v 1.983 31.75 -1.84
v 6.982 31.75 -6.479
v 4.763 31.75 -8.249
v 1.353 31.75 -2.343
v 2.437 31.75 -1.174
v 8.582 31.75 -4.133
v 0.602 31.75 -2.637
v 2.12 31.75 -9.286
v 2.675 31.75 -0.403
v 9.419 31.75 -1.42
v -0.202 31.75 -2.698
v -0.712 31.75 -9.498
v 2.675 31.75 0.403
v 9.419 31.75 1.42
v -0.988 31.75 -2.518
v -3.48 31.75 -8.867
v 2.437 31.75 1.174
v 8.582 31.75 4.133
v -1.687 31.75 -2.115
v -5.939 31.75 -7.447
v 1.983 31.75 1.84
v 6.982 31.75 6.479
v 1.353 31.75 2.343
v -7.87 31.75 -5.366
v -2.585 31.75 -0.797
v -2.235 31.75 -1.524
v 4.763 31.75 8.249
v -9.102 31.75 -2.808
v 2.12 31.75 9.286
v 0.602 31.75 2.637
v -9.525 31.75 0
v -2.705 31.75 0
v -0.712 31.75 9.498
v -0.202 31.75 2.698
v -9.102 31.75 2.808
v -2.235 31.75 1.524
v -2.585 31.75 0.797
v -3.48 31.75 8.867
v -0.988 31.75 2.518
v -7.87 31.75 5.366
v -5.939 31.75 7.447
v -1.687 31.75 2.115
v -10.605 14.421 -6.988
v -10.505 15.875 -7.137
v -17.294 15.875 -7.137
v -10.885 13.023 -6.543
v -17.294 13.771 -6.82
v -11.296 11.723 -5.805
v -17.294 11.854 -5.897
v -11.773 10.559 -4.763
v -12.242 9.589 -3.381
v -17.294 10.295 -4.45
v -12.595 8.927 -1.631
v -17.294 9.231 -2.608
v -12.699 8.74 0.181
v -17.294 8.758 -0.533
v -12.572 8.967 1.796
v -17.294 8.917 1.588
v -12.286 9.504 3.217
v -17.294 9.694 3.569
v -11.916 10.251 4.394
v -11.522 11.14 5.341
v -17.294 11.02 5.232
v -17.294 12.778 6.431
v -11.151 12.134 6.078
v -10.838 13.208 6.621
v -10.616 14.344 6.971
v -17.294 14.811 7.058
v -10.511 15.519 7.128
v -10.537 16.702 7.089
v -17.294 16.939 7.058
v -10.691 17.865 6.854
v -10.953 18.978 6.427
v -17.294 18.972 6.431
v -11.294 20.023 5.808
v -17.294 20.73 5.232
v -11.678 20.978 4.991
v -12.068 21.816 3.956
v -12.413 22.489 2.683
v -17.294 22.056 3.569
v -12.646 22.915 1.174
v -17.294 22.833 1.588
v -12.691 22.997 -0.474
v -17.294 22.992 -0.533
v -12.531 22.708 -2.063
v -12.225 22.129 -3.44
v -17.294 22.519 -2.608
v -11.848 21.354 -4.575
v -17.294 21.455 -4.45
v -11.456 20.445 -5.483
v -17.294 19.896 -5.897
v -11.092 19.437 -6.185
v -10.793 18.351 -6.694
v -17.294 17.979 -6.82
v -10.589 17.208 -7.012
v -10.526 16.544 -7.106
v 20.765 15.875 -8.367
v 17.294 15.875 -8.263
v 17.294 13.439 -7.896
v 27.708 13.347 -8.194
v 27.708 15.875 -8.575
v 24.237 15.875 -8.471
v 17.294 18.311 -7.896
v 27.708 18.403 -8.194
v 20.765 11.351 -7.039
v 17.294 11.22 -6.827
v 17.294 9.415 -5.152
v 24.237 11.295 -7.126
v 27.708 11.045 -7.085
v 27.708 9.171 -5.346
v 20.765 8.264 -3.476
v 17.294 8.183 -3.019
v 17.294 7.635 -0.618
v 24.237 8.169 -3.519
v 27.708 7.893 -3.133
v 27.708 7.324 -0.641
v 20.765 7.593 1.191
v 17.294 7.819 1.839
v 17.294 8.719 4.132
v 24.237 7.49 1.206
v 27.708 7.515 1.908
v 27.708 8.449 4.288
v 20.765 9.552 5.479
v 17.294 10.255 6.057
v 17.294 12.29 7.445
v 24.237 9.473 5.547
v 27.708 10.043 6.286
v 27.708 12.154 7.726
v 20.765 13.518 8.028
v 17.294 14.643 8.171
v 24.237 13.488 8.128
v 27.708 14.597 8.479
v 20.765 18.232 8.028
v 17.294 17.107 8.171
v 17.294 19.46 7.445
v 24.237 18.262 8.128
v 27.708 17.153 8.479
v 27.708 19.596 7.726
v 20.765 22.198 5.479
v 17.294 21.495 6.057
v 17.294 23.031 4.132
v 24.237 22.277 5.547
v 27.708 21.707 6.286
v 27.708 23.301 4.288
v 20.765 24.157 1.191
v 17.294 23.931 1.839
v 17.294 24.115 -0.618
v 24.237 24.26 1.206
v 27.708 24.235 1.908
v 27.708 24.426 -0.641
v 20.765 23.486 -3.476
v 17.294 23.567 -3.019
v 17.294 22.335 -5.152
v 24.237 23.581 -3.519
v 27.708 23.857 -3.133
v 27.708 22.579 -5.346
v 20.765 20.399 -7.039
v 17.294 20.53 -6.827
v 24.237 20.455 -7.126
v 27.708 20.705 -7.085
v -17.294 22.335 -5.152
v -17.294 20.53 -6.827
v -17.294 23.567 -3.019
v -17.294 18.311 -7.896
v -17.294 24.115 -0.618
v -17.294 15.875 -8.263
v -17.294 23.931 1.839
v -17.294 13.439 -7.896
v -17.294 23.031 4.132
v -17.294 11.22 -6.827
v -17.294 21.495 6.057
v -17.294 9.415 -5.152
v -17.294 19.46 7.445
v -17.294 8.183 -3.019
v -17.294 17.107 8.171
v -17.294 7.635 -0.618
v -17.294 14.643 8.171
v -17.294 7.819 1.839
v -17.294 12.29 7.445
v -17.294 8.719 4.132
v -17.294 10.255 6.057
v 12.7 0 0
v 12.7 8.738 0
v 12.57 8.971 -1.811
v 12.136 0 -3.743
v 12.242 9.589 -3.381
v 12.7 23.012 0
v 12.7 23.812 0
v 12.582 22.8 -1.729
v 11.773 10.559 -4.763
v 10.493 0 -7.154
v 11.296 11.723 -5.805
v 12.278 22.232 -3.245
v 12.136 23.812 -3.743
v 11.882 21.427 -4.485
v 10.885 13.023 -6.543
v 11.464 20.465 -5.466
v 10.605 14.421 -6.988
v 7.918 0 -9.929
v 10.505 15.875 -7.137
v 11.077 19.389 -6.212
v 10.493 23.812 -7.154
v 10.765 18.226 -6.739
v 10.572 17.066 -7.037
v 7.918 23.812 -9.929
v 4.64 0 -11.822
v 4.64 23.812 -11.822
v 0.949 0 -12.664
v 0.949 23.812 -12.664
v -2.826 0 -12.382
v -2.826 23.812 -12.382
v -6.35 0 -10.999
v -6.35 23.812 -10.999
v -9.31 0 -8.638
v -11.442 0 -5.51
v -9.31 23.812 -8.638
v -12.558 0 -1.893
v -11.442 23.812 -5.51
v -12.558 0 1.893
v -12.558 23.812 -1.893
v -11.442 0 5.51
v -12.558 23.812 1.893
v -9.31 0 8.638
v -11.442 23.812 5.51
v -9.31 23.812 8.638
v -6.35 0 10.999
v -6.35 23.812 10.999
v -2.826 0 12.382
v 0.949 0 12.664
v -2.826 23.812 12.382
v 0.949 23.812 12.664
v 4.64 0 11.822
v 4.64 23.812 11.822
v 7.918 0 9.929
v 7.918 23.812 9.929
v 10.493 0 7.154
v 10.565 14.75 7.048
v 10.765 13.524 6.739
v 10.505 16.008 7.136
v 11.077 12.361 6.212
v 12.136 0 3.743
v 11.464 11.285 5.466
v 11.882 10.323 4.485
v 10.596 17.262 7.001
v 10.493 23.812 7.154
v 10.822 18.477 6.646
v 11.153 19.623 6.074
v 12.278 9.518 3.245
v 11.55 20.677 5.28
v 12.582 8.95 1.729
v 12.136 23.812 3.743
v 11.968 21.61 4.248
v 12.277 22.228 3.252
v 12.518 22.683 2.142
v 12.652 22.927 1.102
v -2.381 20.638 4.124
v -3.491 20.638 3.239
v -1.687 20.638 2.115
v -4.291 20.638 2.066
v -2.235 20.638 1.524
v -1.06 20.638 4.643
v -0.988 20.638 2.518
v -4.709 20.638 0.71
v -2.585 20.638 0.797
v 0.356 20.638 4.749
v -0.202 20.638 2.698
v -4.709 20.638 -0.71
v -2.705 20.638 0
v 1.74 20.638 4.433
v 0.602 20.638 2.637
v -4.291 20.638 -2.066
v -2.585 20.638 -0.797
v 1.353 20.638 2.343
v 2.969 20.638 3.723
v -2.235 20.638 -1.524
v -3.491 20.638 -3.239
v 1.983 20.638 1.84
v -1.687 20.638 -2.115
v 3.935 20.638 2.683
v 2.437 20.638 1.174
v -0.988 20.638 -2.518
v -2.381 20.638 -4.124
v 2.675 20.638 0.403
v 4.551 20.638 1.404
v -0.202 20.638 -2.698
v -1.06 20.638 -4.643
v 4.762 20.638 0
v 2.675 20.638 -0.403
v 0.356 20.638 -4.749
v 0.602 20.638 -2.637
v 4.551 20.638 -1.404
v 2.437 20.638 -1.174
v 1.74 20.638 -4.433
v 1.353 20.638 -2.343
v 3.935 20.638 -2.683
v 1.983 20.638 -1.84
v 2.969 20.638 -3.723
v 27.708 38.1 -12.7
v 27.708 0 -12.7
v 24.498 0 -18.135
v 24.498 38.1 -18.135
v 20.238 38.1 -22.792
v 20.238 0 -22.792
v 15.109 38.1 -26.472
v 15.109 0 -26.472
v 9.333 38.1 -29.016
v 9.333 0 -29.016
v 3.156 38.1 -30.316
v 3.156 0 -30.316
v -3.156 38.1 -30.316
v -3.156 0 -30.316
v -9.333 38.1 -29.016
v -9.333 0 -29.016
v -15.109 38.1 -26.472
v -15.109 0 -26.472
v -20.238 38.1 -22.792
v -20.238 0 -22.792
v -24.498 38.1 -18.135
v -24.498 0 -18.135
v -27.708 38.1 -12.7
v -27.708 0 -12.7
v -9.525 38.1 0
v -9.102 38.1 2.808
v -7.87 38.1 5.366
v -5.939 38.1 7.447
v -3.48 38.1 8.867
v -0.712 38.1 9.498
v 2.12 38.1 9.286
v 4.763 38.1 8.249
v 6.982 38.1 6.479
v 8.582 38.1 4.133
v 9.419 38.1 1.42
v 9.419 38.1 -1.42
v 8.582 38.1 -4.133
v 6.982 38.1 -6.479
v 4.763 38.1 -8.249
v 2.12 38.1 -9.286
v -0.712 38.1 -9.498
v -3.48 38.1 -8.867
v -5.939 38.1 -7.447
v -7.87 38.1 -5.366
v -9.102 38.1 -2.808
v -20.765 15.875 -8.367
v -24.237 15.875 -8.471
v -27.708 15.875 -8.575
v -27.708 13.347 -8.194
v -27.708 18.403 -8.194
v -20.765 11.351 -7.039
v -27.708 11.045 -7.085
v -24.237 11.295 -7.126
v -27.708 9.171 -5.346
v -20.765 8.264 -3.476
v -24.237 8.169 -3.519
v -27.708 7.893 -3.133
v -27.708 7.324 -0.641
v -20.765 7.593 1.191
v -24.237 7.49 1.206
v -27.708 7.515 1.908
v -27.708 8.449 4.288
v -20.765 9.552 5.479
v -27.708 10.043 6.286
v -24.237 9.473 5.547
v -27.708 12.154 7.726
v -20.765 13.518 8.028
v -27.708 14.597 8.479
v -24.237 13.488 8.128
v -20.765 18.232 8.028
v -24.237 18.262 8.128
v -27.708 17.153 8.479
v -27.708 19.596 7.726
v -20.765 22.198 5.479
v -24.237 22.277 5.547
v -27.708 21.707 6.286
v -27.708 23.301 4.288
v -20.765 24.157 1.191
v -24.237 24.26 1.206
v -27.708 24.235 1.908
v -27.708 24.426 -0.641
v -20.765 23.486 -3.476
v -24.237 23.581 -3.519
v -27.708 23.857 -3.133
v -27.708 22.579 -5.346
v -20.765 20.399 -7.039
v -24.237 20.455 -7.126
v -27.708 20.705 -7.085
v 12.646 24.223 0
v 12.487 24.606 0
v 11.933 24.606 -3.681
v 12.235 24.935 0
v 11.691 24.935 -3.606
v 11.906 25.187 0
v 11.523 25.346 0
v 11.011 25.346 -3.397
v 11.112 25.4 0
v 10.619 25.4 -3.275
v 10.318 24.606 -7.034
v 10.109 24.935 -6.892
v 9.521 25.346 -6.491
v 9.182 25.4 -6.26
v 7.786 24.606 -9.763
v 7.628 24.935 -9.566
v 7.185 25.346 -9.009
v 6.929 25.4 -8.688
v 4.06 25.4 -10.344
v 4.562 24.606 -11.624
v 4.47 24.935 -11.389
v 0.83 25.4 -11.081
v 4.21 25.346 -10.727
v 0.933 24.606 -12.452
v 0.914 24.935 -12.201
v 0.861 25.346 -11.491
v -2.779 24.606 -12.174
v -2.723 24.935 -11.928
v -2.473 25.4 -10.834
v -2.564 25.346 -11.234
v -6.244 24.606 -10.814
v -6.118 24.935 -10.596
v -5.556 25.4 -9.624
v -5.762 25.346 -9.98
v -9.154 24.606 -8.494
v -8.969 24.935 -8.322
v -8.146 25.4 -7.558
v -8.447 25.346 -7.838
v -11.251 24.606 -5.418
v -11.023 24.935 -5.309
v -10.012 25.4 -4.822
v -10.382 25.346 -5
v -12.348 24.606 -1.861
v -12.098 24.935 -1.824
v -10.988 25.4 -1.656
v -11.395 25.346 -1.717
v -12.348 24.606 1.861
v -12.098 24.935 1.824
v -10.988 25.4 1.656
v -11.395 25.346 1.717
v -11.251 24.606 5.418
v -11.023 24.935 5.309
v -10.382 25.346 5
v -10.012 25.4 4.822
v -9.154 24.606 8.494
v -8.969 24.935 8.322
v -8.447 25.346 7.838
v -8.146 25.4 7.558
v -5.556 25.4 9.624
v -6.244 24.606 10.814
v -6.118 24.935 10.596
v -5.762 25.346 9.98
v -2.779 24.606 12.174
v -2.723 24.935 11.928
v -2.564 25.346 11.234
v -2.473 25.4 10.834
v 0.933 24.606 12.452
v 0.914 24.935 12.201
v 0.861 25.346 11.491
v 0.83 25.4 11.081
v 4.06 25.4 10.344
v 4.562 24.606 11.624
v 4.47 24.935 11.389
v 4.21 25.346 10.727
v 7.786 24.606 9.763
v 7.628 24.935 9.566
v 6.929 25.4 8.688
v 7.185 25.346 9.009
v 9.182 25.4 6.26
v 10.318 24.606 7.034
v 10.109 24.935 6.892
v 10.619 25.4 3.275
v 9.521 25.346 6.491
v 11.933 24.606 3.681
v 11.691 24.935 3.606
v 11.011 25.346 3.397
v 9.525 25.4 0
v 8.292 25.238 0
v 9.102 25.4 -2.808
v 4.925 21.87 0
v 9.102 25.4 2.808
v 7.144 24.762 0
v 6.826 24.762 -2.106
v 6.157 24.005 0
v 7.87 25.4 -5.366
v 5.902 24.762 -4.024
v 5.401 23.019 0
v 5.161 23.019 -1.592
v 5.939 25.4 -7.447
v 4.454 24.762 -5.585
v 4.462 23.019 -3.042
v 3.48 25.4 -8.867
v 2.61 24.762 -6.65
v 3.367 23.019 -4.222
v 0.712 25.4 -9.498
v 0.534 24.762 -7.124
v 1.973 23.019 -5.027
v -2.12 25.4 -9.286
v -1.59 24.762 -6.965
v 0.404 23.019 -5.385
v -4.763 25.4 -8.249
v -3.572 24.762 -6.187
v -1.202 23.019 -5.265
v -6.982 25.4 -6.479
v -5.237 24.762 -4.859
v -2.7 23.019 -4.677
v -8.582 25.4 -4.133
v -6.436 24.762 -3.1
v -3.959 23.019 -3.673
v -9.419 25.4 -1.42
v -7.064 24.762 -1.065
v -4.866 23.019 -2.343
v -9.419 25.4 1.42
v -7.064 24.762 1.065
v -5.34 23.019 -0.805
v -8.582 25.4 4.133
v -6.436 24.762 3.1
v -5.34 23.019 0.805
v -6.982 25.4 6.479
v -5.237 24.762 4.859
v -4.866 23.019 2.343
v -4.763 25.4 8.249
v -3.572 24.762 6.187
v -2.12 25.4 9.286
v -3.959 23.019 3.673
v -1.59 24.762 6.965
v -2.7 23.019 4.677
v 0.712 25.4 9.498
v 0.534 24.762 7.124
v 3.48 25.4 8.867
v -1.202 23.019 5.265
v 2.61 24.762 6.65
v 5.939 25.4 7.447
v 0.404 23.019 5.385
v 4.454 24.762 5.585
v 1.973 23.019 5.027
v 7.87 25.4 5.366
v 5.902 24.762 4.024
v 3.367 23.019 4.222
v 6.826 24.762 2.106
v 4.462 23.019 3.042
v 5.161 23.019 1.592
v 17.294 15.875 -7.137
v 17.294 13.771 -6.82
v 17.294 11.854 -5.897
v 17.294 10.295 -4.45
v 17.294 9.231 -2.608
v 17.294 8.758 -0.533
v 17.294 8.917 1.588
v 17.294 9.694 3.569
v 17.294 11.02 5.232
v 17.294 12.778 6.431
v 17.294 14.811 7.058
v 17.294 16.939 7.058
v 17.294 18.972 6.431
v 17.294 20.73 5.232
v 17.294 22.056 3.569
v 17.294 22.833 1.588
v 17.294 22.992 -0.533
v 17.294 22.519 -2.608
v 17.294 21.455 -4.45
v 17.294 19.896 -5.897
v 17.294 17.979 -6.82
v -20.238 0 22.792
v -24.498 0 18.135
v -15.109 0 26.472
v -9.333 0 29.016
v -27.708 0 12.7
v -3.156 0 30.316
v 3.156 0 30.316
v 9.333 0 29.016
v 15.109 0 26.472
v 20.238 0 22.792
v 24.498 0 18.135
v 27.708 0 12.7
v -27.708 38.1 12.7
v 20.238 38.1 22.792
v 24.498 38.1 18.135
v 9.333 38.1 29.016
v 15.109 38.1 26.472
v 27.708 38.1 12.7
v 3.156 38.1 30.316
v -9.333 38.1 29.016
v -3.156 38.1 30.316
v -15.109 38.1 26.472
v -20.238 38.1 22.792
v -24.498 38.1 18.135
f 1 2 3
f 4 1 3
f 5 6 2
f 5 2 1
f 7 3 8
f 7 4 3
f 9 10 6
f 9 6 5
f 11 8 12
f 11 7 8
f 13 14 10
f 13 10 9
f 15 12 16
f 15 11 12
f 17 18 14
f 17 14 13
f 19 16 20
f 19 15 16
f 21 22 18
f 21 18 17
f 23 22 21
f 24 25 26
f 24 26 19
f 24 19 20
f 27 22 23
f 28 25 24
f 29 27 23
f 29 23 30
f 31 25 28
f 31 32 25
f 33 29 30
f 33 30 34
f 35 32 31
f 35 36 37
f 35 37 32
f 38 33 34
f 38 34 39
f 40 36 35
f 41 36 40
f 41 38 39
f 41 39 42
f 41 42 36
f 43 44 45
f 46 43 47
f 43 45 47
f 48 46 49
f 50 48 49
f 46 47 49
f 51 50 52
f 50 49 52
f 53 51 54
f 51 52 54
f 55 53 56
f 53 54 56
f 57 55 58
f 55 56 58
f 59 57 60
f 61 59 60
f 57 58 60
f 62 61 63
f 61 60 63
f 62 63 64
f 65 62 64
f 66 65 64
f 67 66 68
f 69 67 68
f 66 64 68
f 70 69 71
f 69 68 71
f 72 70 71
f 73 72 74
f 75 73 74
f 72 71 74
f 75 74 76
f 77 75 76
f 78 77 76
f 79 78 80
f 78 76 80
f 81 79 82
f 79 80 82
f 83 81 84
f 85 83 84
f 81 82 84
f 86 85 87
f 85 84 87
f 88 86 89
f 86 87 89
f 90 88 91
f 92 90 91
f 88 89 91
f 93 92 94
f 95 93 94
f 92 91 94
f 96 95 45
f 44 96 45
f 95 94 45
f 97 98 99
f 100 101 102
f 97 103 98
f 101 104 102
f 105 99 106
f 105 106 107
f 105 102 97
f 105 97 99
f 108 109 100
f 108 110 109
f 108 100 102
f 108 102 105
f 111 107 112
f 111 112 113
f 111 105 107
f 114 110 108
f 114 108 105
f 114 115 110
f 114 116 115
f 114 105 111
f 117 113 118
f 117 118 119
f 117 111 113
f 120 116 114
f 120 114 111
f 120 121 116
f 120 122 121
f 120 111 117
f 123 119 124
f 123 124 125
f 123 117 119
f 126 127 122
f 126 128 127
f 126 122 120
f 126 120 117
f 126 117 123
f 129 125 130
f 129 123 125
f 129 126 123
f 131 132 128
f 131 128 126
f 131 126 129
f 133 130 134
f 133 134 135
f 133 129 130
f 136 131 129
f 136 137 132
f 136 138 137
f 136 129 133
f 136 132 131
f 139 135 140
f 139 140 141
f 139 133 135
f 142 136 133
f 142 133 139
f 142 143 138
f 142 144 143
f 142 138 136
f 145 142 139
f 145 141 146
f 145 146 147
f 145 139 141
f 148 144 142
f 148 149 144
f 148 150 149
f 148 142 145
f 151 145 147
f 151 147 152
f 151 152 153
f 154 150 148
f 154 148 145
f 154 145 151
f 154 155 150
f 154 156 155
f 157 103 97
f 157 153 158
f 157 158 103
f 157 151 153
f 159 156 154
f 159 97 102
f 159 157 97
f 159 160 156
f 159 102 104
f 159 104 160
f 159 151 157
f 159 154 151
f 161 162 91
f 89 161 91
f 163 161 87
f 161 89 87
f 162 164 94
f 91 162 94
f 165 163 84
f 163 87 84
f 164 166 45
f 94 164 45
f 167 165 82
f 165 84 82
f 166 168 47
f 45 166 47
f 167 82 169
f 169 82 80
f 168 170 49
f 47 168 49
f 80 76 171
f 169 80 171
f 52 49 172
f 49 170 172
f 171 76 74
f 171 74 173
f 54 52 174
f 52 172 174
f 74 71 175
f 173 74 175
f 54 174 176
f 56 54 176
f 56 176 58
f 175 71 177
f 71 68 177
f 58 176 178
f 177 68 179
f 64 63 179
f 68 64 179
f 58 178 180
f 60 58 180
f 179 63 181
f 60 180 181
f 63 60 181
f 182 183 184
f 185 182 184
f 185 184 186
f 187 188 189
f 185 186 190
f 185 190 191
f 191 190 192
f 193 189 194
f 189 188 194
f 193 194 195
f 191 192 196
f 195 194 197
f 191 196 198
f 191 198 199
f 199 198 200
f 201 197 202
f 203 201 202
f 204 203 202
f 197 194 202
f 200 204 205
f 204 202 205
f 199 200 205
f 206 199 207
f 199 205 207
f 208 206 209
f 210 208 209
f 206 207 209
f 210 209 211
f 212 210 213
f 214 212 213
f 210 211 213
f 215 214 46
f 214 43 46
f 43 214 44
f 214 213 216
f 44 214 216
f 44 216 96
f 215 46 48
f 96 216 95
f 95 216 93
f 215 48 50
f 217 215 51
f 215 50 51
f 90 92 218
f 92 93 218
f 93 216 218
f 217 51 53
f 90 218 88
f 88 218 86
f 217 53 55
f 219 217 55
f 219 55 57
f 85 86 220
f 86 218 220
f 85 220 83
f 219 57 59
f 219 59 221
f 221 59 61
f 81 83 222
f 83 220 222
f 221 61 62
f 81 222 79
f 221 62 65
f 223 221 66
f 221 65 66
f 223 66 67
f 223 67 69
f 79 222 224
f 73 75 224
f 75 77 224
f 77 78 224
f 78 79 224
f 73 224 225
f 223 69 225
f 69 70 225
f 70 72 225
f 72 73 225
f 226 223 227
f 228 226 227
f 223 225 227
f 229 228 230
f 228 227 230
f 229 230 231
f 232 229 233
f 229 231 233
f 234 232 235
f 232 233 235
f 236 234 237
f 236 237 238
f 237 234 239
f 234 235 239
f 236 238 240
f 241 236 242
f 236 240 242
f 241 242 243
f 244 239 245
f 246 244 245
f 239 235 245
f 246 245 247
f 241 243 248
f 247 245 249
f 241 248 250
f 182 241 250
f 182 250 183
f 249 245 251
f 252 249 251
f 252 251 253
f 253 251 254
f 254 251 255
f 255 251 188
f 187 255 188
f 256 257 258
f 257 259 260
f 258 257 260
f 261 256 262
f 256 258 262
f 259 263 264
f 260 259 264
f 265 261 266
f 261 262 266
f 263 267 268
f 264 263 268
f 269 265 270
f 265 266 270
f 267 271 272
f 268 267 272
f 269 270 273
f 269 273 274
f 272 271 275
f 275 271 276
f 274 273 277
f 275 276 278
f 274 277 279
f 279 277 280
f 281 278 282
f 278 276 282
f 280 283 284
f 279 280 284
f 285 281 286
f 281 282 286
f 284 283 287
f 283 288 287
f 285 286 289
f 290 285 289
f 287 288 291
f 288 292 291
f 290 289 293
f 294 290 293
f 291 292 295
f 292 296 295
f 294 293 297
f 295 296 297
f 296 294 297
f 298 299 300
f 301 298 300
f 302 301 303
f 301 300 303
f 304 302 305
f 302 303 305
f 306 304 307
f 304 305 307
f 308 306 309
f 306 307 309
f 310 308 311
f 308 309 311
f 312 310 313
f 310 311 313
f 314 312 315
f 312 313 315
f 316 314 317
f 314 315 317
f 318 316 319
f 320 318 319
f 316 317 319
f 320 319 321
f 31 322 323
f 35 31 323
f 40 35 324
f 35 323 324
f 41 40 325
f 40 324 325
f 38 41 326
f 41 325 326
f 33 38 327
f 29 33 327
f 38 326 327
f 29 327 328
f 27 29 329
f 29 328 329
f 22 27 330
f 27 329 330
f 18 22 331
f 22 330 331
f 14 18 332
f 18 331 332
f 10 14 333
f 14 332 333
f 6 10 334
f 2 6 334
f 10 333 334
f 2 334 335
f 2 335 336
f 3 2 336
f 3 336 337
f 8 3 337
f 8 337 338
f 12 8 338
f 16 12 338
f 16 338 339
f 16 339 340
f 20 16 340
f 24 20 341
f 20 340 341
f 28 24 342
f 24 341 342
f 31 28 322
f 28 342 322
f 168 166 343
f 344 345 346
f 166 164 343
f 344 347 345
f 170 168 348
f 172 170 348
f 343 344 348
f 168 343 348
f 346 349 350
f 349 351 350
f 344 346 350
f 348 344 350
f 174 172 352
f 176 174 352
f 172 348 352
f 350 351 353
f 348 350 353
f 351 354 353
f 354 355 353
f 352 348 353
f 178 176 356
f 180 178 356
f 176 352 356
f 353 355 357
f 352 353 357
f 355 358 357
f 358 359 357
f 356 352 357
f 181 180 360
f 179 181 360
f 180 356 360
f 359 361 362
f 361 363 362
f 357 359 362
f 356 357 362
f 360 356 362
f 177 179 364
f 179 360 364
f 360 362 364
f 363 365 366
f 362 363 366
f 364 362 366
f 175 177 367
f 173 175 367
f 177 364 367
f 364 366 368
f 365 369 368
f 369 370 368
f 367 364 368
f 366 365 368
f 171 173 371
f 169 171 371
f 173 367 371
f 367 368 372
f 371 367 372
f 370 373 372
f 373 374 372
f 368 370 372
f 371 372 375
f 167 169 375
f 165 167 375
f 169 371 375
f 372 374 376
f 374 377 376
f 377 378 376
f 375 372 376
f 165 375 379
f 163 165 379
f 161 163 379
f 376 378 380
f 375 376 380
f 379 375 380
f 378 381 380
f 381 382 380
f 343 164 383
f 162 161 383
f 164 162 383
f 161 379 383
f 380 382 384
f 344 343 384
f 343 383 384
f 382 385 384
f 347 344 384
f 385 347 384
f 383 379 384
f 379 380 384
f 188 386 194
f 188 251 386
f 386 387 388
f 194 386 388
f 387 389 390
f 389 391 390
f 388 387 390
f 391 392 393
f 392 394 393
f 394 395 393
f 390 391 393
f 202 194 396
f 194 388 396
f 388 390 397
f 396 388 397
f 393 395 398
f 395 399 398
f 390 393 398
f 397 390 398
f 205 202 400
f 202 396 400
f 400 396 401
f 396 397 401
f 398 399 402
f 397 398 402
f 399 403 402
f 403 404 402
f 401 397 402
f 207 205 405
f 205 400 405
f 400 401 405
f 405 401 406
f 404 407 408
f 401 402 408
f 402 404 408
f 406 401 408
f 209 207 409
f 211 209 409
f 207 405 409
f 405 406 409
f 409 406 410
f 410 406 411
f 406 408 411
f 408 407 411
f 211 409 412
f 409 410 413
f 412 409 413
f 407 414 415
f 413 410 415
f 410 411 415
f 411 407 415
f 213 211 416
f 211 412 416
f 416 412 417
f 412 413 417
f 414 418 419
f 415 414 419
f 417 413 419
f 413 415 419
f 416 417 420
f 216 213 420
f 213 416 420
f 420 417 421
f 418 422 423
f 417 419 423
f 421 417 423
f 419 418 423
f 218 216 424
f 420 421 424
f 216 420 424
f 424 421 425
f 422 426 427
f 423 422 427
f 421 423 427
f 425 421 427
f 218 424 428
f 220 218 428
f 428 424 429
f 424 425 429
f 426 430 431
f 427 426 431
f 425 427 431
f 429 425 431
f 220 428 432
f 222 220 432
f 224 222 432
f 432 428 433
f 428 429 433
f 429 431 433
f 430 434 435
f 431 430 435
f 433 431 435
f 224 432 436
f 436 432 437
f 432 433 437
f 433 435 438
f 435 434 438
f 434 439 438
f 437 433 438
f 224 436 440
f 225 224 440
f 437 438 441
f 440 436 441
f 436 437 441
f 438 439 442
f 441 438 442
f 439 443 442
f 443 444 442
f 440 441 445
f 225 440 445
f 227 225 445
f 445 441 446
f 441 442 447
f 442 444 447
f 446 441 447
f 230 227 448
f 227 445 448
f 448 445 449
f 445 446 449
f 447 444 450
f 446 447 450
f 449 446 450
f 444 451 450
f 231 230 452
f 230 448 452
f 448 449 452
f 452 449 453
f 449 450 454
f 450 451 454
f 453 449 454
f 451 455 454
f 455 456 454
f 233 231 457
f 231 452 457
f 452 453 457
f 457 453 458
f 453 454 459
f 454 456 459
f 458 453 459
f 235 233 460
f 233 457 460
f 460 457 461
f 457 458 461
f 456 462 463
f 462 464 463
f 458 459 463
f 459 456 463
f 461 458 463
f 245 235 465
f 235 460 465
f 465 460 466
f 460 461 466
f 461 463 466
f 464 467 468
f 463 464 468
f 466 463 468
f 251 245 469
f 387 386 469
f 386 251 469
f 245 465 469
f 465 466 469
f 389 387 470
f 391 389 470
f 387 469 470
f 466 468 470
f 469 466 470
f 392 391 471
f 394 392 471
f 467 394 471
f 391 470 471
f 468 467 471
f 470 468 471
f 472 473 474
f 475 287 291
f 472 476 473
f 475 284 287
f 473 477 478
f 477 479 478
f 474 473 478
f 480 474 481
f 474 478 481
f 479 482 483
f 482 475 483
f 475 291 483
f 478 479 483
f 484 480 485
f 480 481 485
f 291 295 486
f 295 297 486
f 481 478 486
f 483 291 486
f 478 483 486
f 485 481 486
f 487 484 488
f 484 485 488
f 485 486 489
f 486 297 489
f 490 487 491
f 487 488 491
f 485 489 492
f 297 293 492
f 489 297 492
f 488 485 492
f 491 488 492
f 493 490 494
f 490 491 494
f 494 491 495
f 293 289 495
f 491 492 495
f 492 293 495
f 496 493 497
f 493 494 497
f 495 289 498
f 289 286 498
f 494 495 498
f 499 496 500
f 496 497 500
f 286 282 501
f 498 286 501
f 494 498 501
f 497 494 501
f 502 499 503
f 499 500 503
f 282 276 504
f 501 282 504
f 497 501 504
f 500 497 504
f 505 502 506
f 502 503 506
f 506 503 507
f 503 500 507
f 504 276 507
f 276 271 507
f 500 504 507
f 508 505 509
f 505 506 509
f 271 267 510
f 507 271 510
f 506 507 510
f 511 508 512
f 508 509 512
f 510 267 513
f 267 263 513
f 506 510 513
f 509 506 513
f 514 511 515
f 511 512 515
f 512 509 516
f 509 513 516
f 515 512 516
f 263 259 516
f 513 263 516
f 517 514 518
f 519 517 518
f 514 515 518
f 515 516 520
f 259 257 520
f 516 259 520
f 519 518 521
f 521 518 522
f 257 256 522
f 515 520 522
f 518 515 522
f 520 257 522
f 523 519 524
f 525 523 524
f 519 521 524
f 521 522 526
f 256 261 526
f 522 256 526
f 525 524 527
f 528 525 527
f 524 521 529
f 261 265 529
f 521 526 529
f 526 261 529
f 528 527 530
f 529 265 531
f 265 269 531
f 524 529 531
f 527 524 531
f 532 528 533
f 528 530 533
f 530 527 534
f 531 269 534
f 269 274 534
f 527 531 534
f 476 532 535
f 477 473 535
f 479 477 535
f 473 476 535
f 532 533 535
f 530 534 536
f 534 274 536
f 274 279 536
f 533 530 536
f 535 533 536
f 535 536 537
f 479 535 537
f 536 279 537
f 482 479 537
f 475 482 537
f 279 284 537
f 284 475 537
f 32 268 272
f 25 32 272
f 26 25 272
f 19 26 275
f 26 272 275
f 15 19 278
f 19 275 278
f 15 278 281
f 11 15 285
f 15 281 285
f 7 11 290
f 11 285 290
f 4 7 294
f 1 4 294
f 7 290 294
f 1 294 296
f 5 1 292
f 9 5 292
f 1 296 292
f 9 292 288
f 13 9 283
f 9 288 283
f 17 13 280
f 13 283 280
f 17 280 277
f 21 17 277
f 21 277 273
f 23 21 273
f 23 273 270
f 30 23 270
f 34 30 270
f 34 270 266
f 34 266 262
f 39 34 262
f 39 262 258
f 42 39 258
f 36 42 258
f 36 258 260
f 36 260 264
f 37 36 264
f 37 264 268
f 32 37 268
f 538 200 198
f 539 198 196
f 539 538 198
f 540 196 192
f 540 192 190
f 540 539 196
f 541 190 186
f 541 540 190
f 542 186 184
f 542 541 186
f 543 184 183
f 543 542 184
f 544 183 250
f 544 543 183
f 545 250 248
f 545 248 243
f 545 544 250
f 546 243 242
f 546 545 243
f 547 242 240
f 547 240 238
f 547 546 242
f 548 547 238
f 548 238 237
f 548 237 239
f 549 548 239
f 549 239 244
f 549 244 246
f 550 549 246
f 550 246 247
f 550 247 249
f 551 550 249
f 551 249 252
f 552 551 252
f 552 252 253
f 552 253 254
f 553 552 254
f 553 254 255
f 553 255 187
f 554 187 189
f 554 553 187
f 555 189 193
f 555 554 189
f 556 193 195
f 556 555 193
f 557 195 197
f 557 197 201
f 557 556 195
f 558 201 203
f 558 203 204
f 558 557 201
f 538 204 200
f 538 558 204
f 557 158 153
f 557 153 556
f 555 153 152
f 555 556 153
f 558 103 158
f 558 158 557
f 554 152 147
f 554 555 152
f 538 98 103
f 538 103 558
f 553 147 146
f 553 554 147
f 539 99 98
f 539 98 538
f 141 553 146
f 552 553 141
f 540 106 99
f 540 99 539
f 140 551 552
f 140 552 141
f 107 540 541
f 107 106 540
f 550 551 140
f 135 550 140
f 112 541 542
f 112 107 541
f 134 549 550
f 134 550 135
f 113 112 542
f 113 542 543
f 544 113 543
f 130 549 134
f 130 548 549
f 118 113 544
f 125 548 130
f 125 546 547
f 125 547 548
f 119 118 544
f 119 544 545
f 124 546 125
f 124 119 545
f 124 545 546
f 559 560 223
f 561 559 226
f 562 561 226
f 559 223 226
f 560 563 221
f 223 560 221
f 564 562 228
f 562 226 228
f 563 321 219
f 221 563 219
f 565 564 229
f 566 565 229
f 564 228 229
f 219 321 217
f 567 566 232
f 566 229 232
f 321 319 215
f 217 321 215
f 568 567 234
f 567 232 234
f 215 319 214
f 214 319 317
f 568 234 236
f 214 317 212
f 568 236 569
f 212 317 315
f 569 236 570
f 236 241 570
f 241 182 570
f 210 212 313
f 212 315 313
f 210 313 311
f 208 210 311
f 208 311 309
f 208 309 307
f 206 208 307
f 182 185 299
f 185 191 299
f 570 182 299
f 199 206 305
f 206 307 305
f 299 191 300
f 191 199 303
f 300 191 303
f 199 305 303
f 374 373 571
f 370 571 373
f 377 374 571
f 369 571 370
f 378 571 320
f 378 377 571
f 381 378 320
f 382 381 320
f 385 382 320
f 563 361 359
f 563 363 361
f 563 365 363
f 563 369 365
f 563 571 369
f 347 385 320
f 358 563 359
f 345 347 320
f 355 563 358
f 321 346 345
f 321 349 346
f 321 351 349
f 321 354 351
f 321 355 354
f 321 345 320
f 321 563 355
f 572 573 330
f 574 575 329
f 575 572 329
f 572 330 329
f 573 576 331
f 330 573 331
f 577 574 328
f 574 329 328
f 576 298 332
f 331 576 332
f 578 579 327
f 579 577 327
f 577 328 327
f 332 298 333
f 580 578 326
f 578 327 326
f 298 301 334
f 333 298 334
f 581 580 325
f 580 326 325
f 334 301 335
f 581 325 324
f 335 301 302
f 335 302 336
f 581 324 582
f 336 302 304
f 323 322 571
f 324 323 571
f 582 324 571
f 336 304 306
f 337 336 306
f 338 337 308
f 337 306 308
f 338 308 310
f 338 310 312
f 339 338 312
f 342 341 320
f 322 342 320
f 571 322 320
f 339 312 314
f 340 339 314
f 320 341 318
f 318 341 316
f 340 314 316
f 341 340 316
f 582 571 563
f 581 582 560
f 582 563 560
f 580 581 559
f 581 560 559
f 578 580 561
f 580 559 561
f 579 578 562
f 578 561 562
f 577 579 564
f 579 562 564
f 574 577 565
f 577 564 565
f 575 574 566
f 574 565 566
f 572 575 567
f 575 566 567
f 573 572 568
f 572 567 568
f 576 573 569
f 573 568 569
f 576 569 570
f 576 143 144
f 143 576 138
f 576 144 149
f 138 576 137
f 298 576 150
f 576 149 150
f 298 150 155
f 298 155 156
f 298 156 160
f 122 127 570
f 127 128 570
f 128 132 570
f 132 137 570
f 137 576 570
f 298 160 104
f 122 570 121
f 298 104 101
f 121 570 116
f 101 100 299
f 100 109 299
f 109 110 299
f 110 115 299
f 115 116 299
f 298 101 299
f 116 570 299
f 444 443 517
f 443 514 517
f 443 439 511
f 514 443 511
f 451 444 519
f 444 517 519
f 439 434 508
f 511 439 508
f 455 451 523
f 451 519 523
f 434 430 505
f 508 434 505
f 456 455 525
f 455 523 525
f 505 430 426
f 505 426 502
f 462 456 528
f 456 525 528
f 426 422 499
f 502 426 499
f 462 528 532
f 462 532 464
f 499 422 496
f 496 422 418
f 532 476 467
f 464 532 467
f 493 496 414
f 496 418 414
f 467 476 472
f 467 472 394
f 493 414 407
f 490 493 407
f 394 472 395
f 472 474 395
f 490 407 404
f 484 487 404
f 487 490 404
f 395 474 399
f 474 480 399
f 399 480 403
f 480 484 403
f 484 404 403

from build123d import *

# Parameters (mm, degrees)
F_1_4_28_TAPPED_HOLE1_D = 5.4102
SKETCH4_W               = 25.4
SKETCH4_H               = 25.4
FLATS_DEPTH             = 58.529738397
FILLET1_R               = 1.5875
SKETCH7_R               = 9.525
CUT_EXTRUDE1_DEPTH      = 6.35


with BuildPart() as part:
    # Sketch1 → Revolve1 (revolve)
    with BuildSketch(Plane.XY, mode=Mode.PRIVATE) as revolve1_sk:
        with BuildLine():
            Line((0, 38.1), (-30.48, 38.1))
            Line((-30.48, 38.1), (-30.48, 0))
            Line((-30.48, 0), (-12.7, 0))
            Line((-12.7, 0), (-12.7, 25.4))
            Line((-12.7, 25.4), (-9.525, 25.4))
            ThreePointArc((-9.525, 25.4), (-6.157403955, 24.005096045), (-4.7625, 20.6375))
            Line((-4.7625, 20.6375), (0, 20.6375))
            Line((0, 20.6375), (0, 38.1))
        make_face()
    revolve(revolve1_sk.sketch.rotate(Axis((0, 0, 0), (0, 1, 0)), 180), axis=Axis((0, 0, 0), (0, 1, 0)))

    # 1/4-28 Tapped Hole1 (through all)
    with Locations(Plane(origin=(0, 38.1, 0), x_dir=(1, 0, 0), z_dir=(0, 1, 0))):
        with Locations((0, 0)):
            Hole(F_1_4_28_TAPPED_HOLE1_D / 2)

    # Sketch4 → flats (cut, through all)
    with BuildSketch(Plane(origin=(0, 0, 0), x_dir=(1, 0, 0), z_dir=(0, 1, 0))):
        with Locations((-40.408128771, 0)):
            Rectangle(SKETCH4_W, SKETCH4_H)
        with Locations((40.408128771, 0)):
            Rectangle(SKETCH4_W, SKETCH4_H)
    extrude(amount=FLATS_DEPTH, mode=Mode.SUBTRACT)

    # Sketch6 → 3/8 NPT Tapped Hole1 (revolve, cut)
    with BuildSketch(Plane(origin=(27.708128771, 15.875, 0), x_dir=(0, 0, -1), z_dir=(0, 1, 0))):
        Polygon((0, 0), (0, 21.814582582), (7.1374, 17.526), (7.1374, 10.414), (8.263205494, 10.414), (8.5750146, 0), align=None)
    f_3_8_npt_tapped_hole1 = revolve(axis=Axis((34.058128771, 15.875, 0), (-1, 0, 0)), mode=Mode.SUBTRACT)

    # Mirror1: 3/8 NPT Tapped Hole1 across plane
    add(f_3_8_npt_tapped_hole1.mirror(Plane(origin=(0, 0, 0), x_dir=(0, 0, 1), z_dir=(1, 0, 0))), mode=Mode.SUBTRACT)

    # Fillet1
    fillet1_edges = [part.edges().sort_by_distance(p)[0] for p in [
        (-12.7, 25.4, 0),
    ]]
    fillet(fillet1_edges, radius=FILLET1_R)

    # Sketch7 → Cut-Extrude1 (cut)
    with BuildSketch(Plane(origin=(0, 38.1, 0), x_dir=(1, 0, 0), z_dir=(0, 1, 0))):
        with Locations(Location((0, 0, 0), (0, 0, 180))):
            Circle(SKETCH7_R)
    extrude(amount=-CUT_EXTRUDE1_DEPTH, mode=Mode.SUBTRACT)


solid = part.part
